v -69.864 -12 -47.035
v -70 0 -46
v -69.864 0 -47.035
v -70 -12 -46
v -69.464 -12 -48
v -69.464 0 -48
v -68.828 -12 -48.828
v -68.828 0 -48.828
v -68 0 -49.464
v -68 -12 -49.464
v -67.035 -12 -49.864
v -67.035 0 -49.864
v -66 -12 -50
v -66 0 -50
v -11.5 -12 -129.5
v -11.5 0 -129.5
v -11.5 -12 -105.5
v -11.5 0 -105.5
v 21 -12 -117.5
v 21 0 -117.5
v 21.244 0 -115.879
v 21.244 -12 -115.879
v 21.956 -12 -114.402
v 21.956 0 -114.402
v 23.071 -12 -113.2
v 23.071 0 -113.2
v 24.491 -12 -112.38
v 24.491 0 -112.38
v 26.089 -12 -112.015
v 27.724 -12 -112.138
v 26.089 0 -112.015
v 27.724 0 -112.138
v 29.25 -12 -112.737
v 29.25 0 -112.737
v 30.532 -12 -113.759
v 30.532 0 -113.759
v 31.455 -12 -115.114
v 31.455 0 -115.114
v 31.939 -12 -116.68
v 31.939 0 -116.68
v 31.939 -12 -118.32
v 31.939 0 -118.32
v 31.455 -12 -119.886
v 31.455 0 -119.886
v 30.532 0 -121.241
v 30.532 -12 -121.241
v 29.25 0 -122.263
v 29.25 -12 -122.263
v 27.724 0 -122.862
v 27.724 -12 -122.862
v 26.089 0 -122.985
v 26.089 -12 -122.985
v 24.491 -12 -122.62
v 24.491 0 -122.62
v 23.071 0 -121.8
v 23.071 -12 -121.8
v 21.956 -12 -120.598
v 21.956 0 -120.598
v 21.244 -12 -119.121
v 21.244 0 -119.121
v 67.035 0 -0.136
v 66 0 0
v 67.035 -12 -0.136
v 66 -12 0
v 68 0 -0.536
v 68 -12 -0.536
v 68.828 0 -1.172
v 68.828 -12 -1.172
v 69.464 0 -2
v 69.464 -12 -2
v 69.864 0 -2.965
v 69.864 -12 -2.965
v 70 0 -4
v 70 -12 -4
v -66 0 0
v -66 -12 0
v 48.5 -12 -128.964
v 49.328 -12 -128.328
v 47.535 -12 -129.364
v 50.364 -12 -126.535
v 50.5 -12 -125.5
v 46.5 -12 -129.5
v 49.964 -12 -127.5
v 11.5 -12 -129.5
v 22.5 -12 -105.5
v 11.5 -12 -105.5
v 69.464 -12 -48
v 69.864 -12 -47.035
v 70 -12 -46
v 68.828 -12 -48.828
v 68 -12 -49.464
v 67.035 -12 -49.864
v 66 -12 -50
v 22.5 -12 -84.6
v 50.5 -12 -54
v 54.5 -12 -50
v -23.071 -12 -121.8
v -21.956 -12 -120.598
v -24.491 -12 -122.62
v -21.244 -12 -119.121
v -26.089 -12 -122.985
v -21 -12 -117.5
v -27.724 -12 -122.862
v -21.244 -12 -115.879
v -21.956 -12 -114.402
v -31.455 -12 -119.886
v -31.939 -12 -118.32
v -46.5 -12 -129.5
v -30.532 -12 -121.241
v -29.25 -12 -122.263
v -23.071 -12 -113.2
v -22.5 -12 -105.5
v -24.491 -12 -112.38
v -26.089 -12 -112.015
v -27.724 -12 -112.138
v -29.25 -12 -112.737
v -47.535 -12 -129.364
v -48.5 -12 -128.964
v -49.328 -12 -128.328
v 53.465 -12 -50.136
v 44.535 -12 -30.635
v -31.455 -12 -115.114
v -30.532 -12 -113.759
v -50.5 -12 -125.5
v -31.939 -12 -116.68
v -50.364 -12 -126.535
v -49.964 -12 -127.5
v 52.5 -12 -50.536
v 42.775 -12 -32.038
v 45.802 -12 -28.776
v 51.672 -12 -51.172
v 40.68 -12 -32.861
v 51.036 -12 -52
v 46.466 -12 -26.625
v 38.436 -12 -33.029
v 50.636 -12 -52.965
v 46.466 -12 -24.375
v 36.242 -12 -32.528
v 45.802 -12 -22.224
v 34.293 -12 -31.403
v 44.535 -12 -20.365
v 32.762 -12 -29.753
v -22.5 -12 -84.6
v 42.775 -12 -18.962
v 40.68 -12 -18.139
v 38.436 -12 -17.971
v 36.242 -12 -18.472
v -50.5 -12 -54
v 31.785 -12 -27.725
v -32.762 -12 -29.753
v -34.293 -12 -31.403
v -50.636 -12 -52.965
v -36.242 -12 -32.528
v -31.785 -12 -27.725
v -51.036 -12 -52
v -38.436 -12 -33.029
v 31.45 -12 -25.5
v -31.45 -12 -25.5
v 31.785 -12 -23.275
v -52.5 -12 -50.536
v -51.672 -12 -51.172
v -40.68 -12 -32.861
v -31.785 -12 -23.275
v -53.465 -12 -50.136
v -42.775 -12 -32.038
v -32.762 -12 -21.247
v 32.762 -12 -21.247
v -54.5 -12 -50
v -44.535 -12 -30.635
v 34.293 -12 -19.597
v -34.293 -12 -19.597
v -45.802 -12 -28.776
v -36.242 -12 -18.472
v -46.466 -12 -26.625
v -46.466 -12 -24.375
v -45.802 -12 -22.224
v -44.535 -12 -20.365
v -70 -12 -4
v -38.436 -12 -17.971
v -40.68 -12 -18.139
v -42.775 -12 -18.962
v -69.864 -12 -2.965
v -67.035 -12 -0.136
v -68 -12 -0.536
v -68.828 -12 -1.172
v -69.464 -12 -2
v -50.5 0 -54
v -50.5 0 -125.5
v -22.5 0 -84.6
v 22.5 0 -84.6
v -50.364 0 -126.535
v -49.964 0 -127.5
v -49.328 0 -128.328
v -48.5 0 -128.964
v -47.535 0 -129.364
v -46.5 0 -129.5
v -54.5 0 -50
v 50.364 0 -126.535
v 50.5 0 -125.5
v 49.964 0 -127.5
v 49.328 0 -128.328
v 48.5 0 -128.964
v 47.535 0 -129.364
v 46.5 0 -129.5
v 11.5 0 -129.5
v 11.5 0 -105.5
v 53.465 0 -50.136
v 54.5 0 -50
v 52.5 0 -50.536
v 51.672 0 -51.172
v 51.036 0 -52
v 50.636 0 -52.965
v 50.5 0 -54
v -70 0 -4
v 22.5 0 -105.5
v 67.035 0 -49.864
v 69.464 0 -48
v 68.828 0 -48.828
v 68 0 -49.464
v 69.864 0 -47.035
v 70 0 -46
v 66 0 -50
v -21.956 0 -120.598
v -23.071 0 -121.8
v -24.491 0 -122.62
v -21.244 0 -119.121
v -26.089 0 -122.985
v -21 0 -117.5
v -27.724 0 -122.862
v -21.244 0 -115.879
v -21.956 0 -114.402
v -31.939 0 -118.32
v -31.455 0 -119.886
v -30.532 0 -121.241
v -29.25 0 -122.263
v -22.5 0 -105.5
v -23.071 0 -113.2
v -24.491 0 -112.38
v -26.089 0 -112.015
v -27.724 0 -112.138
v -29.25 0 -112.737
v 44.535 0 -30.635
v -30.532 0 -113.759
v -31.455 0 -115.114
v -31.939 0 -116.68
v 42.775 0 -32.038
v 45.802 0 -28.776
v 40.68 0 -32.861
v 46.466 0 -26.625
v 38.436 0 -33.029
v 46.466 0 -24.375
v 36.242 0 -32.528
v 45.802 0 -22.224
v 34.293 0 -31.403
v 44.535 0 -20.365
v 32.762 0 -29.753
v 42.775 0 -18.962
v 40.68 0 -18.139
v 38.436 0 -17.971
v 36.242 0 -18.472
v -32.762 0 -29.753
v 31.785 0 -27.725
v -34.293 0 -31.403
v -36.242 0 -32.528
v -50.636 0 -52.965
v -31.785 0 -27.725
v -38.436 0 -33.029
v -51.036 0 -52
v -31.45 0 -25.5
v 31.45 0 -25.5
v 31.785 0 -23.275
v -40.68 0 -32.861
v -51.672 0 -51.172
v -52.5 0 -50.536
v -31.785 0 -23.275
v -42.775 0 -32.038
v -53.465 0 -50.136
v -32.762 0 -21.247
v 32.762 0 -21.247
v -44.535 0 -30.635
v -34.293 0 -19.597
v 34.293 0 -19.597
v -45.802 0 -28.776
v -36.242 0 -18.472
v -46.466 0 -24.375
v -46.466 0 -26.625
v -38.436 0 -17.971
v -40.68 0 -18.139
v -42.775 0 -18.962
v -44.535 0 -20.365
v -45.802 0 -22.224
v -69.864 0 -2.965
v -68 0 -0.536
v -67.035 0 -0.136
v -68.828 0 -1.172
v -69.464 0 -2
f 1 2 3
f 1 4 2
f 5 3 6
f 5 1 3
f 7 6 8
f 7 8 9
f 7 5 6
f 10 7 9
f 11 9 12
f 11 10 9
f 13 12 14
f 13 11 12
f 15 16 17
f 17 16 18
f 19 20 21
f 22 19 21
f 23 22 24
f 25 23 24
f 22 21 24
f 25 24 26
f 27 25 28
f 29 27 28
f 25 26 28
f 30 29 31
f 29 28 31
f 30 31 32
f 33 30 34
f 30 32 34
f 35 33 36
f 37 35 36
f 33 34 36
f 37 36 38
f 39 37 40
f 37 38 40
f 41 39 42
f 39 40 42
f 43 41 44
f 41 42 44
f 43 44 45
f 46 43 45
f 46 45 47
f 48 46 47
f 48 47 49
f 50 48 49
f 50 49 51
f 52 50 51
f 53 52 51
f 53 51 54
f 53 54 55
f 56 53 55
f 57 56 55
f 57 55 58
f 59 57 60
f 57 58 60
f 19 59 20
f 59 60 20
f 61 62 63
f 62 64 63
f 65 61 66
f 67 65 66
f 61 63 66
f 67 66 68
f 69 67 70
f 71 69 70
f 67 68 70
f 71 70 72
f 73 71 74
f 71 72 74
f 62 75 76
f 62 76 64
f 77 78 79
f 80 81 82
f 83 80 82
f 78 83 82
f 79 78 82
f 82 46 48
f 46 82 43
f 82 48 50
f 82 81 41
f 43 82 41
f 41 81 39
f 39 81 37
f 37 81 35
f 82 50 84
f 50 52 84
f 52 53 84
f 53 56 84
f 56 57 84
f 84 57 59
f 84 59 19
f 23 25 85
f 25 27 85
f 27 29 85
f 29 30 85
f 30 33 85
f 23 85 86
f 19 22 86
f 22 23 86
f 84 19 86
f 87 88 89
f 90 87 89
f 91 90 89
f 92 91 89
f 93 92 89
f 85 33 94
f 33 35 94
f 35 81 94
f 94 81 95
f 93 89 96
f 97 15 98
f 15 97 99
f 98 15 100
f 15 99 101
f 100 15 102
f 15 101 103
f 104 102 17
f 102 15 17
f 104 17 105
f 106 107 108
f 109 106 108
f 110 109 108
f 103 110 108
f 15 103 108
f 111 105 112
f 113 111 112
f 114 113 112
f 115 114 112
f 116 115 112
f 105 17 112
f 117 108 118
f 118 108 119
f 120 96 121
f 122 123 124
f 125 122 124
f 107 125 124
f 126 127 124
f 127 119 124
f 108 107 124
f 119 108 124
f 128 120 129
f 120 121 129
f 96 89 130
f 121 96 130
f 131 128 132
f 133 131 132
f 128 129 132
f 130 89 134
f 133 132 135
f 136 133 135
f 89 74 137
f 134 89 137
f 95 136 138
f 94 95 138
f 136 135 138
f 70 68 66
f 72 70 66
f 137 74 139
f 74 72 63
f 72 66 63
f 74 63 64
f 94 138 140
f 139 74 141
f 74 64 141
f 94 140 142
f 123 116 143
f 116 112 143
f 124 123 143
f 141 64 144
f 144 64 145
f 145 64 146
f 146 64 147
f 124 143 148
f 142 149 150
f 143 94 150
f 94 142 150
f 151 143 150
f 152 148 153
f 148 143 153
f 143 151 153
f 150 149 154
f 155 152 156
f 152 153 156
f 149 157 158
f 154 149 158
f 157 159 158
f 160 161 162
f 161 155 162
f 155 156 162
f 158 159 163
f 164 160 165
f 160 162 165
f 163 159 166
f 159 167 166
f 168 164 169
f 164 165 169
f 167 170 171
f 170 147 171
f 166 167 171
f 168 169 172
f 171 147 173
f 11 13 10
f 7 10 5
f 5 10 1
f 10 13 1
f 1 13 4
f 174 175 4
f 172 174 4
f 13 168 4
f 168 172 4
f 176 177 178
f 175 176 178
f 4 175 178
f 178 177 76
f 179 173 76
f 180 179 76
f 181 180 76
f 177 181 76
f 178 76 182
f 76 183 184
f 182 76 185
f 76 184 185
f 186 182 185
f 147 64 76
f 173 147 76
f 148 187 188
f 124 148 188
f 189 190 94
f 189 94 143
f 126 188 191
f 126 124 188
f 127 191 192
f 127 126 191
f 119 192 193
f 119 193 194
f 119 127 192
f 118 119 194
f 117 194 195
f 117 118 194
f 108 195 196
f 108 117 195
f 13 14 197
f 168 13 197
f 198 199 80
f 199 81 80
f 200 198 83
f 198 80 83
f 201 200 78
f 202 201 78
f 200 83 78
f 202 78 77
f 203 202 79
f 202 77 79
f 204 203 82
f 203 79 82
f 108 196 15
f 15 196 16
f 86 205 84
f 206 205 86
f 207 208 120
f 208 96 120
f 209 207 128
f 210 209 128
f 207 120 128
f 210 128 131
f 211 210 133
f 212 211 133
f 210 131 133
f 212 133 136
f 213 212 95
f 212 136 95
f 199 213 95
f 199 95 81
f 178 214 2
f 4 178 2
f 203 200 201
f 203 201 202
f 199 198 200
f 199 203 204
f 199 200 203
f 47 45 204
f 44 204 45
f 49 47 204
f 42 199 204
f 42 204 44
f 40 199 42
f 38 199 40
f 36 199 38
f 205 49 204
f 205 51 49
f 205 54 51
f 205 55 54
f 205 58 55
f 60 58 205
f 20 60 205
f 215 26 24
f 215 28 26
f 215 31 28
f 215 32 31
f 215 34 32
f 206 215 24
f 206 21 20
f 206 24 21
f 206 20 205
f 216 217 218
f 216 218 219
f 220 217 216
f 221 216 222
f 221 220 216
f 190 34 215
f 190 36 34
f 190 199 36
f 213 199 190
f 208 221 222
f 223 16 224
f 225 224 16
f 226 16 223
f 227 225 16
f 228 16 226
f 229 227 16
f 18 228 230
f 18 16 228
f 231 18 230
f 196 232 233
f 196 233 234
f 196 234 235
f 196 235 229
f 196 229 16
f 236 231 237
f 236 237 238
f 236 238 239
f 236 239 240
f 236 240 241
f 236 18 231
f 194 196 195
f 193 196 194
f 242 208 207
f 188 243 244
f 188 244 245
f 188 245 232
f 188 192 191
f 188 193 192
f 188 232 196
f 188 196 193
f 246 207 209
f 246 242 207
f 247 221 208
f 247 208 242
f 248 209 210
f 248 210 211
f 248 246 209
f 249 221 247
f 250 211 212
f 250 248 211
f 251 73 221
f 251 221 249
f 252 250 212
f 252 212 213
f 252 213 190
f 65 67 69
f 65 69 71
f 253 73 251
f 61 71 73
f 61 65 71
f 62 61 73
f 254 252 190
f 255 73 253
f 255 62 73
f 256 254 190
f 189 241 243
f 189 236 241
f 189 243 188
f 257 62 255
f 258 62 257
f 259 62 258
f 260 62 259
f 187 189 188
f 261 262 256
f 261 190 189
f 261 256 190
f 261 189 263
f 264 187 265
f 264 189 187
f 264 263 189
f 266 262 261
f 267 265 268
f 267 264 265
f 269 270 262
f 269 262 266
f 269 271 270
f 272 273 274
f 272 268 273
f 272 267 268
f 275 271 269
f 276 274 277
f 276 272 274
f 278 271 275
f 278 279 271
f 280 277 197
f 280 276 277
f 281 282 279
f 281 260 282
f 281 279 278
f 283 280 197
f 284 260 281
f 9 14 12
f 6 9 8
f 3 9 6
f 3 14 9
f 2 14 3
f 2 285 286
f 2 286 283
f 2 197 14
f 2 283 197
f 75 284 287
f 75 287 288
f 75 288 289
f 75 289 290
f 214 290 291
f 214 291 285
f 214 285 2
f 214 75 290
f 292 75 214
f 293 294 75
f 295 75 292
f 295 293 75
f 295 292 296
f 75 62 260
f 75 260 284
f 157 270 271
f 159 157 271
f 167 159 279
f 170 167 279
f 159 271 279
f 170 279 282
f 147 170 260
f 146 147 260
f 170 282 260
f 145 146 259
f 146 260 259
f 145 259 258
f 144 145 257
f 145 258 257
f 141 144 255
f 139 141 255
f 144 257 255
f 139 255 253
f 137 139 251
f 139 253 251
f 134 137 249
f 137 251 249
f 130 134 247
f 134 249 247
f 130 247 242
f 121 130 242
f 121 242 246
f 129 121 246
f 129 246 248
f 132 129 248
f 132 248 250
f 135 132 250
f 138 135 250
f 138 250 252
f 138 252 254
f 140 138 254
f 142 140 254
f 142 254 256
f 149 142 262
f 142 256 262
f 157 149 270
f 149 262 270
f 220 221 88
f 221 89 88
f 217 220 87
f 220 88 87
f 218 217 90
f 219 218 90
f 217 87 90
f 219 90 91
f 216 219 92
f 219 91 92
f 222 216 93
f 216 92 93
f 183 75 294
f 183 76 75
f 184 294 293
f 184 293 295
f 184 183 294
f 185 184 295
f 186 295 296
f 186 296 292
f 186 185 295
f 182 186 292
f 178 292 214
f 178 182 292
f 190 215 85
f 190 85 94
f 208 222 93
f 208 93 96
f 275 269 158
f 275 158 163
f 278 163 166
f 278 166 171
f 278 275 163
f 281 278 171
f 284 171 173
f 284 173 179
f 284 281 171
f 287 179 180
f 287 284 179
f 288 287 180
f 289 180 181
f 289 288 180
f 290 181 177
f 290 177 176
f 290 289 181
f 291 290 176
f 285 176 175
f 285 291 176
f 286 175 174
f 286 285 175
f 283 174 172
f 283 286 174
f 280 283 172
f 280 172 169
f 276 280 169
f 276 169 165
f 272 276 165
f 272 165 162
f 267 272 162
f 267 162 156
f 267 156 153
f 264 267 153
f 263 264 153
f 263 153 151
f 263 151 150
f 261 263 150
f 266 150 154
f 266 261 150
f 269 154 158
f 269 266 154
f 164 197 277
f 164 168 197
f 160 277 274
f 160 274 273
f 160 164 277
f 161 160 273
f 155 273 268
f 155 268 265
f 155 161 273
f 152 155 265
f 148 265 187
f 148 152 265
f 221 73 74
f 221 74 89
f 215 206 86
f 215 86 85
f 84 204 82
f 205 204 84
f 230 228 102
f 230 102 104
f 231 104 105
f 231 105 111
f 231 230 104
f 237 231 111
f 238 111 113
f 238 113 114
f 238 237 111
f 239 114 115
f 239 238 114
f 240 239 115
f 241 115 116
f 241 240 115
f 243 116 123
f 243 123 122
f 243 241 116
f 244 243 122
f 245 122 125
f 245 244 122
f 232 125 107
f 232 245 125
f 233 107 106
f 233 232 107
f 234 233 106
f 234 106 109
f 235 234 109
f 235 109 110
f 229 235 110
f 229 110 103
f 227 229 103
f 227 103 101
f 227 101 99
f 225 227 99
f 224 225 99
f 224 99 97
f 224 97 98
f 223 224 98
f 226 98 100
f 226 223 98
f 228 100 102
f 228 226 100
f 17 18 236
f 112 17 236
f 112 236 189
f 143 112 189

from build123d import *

# Parameters (mm, degrees)
F0_R     = 5.5
F0_R_2   = 7.55
F1_DEPTH = 12
F2_R     = 4


with BuildPart() as f1:
    # F0 (on Front) → F1 (new body)
    with BuildSketch(Plane.XZ):
        Polygon((0, -84.6), (0, 0), (-70, 0), (-70, -50), (-50.5, -50), (-50.5, -129.5), (-11.5, -129.5), (-11.5, -105.5), (-22.5, -105.5), (-22.5, -84.6), align=None)
        with Locations((-26.5, -117.5)):
            Circle(F0_R, mode=Mode.SUBTRACT)
        with Locations((-39, -25.5)):
            Circle(F0_R_2, mode=Mode.SUBTRACT)
    extrude(amount=F1_DEPTH)

    # F2
    f2_edges = [f1.edges().sort_by_distance(p)[0] for p in [
        (-50.5, -6, -129.5),
        (-50.5, -6, -50),
        (-70, -6, -50),
        (-70, -6, 0),
    ]]
    fillet(f2_edges, radius=F2_R)

    # F3: F1 across face


with BuildPart() as f1_1:
    add(f1.part)
    add(f1.part.mirror(Plane(origin=(0, -6, -42.3), x_dir=(0, 1, 0), z_dir=(1, 0, 0))))


solid = f1_1.part
